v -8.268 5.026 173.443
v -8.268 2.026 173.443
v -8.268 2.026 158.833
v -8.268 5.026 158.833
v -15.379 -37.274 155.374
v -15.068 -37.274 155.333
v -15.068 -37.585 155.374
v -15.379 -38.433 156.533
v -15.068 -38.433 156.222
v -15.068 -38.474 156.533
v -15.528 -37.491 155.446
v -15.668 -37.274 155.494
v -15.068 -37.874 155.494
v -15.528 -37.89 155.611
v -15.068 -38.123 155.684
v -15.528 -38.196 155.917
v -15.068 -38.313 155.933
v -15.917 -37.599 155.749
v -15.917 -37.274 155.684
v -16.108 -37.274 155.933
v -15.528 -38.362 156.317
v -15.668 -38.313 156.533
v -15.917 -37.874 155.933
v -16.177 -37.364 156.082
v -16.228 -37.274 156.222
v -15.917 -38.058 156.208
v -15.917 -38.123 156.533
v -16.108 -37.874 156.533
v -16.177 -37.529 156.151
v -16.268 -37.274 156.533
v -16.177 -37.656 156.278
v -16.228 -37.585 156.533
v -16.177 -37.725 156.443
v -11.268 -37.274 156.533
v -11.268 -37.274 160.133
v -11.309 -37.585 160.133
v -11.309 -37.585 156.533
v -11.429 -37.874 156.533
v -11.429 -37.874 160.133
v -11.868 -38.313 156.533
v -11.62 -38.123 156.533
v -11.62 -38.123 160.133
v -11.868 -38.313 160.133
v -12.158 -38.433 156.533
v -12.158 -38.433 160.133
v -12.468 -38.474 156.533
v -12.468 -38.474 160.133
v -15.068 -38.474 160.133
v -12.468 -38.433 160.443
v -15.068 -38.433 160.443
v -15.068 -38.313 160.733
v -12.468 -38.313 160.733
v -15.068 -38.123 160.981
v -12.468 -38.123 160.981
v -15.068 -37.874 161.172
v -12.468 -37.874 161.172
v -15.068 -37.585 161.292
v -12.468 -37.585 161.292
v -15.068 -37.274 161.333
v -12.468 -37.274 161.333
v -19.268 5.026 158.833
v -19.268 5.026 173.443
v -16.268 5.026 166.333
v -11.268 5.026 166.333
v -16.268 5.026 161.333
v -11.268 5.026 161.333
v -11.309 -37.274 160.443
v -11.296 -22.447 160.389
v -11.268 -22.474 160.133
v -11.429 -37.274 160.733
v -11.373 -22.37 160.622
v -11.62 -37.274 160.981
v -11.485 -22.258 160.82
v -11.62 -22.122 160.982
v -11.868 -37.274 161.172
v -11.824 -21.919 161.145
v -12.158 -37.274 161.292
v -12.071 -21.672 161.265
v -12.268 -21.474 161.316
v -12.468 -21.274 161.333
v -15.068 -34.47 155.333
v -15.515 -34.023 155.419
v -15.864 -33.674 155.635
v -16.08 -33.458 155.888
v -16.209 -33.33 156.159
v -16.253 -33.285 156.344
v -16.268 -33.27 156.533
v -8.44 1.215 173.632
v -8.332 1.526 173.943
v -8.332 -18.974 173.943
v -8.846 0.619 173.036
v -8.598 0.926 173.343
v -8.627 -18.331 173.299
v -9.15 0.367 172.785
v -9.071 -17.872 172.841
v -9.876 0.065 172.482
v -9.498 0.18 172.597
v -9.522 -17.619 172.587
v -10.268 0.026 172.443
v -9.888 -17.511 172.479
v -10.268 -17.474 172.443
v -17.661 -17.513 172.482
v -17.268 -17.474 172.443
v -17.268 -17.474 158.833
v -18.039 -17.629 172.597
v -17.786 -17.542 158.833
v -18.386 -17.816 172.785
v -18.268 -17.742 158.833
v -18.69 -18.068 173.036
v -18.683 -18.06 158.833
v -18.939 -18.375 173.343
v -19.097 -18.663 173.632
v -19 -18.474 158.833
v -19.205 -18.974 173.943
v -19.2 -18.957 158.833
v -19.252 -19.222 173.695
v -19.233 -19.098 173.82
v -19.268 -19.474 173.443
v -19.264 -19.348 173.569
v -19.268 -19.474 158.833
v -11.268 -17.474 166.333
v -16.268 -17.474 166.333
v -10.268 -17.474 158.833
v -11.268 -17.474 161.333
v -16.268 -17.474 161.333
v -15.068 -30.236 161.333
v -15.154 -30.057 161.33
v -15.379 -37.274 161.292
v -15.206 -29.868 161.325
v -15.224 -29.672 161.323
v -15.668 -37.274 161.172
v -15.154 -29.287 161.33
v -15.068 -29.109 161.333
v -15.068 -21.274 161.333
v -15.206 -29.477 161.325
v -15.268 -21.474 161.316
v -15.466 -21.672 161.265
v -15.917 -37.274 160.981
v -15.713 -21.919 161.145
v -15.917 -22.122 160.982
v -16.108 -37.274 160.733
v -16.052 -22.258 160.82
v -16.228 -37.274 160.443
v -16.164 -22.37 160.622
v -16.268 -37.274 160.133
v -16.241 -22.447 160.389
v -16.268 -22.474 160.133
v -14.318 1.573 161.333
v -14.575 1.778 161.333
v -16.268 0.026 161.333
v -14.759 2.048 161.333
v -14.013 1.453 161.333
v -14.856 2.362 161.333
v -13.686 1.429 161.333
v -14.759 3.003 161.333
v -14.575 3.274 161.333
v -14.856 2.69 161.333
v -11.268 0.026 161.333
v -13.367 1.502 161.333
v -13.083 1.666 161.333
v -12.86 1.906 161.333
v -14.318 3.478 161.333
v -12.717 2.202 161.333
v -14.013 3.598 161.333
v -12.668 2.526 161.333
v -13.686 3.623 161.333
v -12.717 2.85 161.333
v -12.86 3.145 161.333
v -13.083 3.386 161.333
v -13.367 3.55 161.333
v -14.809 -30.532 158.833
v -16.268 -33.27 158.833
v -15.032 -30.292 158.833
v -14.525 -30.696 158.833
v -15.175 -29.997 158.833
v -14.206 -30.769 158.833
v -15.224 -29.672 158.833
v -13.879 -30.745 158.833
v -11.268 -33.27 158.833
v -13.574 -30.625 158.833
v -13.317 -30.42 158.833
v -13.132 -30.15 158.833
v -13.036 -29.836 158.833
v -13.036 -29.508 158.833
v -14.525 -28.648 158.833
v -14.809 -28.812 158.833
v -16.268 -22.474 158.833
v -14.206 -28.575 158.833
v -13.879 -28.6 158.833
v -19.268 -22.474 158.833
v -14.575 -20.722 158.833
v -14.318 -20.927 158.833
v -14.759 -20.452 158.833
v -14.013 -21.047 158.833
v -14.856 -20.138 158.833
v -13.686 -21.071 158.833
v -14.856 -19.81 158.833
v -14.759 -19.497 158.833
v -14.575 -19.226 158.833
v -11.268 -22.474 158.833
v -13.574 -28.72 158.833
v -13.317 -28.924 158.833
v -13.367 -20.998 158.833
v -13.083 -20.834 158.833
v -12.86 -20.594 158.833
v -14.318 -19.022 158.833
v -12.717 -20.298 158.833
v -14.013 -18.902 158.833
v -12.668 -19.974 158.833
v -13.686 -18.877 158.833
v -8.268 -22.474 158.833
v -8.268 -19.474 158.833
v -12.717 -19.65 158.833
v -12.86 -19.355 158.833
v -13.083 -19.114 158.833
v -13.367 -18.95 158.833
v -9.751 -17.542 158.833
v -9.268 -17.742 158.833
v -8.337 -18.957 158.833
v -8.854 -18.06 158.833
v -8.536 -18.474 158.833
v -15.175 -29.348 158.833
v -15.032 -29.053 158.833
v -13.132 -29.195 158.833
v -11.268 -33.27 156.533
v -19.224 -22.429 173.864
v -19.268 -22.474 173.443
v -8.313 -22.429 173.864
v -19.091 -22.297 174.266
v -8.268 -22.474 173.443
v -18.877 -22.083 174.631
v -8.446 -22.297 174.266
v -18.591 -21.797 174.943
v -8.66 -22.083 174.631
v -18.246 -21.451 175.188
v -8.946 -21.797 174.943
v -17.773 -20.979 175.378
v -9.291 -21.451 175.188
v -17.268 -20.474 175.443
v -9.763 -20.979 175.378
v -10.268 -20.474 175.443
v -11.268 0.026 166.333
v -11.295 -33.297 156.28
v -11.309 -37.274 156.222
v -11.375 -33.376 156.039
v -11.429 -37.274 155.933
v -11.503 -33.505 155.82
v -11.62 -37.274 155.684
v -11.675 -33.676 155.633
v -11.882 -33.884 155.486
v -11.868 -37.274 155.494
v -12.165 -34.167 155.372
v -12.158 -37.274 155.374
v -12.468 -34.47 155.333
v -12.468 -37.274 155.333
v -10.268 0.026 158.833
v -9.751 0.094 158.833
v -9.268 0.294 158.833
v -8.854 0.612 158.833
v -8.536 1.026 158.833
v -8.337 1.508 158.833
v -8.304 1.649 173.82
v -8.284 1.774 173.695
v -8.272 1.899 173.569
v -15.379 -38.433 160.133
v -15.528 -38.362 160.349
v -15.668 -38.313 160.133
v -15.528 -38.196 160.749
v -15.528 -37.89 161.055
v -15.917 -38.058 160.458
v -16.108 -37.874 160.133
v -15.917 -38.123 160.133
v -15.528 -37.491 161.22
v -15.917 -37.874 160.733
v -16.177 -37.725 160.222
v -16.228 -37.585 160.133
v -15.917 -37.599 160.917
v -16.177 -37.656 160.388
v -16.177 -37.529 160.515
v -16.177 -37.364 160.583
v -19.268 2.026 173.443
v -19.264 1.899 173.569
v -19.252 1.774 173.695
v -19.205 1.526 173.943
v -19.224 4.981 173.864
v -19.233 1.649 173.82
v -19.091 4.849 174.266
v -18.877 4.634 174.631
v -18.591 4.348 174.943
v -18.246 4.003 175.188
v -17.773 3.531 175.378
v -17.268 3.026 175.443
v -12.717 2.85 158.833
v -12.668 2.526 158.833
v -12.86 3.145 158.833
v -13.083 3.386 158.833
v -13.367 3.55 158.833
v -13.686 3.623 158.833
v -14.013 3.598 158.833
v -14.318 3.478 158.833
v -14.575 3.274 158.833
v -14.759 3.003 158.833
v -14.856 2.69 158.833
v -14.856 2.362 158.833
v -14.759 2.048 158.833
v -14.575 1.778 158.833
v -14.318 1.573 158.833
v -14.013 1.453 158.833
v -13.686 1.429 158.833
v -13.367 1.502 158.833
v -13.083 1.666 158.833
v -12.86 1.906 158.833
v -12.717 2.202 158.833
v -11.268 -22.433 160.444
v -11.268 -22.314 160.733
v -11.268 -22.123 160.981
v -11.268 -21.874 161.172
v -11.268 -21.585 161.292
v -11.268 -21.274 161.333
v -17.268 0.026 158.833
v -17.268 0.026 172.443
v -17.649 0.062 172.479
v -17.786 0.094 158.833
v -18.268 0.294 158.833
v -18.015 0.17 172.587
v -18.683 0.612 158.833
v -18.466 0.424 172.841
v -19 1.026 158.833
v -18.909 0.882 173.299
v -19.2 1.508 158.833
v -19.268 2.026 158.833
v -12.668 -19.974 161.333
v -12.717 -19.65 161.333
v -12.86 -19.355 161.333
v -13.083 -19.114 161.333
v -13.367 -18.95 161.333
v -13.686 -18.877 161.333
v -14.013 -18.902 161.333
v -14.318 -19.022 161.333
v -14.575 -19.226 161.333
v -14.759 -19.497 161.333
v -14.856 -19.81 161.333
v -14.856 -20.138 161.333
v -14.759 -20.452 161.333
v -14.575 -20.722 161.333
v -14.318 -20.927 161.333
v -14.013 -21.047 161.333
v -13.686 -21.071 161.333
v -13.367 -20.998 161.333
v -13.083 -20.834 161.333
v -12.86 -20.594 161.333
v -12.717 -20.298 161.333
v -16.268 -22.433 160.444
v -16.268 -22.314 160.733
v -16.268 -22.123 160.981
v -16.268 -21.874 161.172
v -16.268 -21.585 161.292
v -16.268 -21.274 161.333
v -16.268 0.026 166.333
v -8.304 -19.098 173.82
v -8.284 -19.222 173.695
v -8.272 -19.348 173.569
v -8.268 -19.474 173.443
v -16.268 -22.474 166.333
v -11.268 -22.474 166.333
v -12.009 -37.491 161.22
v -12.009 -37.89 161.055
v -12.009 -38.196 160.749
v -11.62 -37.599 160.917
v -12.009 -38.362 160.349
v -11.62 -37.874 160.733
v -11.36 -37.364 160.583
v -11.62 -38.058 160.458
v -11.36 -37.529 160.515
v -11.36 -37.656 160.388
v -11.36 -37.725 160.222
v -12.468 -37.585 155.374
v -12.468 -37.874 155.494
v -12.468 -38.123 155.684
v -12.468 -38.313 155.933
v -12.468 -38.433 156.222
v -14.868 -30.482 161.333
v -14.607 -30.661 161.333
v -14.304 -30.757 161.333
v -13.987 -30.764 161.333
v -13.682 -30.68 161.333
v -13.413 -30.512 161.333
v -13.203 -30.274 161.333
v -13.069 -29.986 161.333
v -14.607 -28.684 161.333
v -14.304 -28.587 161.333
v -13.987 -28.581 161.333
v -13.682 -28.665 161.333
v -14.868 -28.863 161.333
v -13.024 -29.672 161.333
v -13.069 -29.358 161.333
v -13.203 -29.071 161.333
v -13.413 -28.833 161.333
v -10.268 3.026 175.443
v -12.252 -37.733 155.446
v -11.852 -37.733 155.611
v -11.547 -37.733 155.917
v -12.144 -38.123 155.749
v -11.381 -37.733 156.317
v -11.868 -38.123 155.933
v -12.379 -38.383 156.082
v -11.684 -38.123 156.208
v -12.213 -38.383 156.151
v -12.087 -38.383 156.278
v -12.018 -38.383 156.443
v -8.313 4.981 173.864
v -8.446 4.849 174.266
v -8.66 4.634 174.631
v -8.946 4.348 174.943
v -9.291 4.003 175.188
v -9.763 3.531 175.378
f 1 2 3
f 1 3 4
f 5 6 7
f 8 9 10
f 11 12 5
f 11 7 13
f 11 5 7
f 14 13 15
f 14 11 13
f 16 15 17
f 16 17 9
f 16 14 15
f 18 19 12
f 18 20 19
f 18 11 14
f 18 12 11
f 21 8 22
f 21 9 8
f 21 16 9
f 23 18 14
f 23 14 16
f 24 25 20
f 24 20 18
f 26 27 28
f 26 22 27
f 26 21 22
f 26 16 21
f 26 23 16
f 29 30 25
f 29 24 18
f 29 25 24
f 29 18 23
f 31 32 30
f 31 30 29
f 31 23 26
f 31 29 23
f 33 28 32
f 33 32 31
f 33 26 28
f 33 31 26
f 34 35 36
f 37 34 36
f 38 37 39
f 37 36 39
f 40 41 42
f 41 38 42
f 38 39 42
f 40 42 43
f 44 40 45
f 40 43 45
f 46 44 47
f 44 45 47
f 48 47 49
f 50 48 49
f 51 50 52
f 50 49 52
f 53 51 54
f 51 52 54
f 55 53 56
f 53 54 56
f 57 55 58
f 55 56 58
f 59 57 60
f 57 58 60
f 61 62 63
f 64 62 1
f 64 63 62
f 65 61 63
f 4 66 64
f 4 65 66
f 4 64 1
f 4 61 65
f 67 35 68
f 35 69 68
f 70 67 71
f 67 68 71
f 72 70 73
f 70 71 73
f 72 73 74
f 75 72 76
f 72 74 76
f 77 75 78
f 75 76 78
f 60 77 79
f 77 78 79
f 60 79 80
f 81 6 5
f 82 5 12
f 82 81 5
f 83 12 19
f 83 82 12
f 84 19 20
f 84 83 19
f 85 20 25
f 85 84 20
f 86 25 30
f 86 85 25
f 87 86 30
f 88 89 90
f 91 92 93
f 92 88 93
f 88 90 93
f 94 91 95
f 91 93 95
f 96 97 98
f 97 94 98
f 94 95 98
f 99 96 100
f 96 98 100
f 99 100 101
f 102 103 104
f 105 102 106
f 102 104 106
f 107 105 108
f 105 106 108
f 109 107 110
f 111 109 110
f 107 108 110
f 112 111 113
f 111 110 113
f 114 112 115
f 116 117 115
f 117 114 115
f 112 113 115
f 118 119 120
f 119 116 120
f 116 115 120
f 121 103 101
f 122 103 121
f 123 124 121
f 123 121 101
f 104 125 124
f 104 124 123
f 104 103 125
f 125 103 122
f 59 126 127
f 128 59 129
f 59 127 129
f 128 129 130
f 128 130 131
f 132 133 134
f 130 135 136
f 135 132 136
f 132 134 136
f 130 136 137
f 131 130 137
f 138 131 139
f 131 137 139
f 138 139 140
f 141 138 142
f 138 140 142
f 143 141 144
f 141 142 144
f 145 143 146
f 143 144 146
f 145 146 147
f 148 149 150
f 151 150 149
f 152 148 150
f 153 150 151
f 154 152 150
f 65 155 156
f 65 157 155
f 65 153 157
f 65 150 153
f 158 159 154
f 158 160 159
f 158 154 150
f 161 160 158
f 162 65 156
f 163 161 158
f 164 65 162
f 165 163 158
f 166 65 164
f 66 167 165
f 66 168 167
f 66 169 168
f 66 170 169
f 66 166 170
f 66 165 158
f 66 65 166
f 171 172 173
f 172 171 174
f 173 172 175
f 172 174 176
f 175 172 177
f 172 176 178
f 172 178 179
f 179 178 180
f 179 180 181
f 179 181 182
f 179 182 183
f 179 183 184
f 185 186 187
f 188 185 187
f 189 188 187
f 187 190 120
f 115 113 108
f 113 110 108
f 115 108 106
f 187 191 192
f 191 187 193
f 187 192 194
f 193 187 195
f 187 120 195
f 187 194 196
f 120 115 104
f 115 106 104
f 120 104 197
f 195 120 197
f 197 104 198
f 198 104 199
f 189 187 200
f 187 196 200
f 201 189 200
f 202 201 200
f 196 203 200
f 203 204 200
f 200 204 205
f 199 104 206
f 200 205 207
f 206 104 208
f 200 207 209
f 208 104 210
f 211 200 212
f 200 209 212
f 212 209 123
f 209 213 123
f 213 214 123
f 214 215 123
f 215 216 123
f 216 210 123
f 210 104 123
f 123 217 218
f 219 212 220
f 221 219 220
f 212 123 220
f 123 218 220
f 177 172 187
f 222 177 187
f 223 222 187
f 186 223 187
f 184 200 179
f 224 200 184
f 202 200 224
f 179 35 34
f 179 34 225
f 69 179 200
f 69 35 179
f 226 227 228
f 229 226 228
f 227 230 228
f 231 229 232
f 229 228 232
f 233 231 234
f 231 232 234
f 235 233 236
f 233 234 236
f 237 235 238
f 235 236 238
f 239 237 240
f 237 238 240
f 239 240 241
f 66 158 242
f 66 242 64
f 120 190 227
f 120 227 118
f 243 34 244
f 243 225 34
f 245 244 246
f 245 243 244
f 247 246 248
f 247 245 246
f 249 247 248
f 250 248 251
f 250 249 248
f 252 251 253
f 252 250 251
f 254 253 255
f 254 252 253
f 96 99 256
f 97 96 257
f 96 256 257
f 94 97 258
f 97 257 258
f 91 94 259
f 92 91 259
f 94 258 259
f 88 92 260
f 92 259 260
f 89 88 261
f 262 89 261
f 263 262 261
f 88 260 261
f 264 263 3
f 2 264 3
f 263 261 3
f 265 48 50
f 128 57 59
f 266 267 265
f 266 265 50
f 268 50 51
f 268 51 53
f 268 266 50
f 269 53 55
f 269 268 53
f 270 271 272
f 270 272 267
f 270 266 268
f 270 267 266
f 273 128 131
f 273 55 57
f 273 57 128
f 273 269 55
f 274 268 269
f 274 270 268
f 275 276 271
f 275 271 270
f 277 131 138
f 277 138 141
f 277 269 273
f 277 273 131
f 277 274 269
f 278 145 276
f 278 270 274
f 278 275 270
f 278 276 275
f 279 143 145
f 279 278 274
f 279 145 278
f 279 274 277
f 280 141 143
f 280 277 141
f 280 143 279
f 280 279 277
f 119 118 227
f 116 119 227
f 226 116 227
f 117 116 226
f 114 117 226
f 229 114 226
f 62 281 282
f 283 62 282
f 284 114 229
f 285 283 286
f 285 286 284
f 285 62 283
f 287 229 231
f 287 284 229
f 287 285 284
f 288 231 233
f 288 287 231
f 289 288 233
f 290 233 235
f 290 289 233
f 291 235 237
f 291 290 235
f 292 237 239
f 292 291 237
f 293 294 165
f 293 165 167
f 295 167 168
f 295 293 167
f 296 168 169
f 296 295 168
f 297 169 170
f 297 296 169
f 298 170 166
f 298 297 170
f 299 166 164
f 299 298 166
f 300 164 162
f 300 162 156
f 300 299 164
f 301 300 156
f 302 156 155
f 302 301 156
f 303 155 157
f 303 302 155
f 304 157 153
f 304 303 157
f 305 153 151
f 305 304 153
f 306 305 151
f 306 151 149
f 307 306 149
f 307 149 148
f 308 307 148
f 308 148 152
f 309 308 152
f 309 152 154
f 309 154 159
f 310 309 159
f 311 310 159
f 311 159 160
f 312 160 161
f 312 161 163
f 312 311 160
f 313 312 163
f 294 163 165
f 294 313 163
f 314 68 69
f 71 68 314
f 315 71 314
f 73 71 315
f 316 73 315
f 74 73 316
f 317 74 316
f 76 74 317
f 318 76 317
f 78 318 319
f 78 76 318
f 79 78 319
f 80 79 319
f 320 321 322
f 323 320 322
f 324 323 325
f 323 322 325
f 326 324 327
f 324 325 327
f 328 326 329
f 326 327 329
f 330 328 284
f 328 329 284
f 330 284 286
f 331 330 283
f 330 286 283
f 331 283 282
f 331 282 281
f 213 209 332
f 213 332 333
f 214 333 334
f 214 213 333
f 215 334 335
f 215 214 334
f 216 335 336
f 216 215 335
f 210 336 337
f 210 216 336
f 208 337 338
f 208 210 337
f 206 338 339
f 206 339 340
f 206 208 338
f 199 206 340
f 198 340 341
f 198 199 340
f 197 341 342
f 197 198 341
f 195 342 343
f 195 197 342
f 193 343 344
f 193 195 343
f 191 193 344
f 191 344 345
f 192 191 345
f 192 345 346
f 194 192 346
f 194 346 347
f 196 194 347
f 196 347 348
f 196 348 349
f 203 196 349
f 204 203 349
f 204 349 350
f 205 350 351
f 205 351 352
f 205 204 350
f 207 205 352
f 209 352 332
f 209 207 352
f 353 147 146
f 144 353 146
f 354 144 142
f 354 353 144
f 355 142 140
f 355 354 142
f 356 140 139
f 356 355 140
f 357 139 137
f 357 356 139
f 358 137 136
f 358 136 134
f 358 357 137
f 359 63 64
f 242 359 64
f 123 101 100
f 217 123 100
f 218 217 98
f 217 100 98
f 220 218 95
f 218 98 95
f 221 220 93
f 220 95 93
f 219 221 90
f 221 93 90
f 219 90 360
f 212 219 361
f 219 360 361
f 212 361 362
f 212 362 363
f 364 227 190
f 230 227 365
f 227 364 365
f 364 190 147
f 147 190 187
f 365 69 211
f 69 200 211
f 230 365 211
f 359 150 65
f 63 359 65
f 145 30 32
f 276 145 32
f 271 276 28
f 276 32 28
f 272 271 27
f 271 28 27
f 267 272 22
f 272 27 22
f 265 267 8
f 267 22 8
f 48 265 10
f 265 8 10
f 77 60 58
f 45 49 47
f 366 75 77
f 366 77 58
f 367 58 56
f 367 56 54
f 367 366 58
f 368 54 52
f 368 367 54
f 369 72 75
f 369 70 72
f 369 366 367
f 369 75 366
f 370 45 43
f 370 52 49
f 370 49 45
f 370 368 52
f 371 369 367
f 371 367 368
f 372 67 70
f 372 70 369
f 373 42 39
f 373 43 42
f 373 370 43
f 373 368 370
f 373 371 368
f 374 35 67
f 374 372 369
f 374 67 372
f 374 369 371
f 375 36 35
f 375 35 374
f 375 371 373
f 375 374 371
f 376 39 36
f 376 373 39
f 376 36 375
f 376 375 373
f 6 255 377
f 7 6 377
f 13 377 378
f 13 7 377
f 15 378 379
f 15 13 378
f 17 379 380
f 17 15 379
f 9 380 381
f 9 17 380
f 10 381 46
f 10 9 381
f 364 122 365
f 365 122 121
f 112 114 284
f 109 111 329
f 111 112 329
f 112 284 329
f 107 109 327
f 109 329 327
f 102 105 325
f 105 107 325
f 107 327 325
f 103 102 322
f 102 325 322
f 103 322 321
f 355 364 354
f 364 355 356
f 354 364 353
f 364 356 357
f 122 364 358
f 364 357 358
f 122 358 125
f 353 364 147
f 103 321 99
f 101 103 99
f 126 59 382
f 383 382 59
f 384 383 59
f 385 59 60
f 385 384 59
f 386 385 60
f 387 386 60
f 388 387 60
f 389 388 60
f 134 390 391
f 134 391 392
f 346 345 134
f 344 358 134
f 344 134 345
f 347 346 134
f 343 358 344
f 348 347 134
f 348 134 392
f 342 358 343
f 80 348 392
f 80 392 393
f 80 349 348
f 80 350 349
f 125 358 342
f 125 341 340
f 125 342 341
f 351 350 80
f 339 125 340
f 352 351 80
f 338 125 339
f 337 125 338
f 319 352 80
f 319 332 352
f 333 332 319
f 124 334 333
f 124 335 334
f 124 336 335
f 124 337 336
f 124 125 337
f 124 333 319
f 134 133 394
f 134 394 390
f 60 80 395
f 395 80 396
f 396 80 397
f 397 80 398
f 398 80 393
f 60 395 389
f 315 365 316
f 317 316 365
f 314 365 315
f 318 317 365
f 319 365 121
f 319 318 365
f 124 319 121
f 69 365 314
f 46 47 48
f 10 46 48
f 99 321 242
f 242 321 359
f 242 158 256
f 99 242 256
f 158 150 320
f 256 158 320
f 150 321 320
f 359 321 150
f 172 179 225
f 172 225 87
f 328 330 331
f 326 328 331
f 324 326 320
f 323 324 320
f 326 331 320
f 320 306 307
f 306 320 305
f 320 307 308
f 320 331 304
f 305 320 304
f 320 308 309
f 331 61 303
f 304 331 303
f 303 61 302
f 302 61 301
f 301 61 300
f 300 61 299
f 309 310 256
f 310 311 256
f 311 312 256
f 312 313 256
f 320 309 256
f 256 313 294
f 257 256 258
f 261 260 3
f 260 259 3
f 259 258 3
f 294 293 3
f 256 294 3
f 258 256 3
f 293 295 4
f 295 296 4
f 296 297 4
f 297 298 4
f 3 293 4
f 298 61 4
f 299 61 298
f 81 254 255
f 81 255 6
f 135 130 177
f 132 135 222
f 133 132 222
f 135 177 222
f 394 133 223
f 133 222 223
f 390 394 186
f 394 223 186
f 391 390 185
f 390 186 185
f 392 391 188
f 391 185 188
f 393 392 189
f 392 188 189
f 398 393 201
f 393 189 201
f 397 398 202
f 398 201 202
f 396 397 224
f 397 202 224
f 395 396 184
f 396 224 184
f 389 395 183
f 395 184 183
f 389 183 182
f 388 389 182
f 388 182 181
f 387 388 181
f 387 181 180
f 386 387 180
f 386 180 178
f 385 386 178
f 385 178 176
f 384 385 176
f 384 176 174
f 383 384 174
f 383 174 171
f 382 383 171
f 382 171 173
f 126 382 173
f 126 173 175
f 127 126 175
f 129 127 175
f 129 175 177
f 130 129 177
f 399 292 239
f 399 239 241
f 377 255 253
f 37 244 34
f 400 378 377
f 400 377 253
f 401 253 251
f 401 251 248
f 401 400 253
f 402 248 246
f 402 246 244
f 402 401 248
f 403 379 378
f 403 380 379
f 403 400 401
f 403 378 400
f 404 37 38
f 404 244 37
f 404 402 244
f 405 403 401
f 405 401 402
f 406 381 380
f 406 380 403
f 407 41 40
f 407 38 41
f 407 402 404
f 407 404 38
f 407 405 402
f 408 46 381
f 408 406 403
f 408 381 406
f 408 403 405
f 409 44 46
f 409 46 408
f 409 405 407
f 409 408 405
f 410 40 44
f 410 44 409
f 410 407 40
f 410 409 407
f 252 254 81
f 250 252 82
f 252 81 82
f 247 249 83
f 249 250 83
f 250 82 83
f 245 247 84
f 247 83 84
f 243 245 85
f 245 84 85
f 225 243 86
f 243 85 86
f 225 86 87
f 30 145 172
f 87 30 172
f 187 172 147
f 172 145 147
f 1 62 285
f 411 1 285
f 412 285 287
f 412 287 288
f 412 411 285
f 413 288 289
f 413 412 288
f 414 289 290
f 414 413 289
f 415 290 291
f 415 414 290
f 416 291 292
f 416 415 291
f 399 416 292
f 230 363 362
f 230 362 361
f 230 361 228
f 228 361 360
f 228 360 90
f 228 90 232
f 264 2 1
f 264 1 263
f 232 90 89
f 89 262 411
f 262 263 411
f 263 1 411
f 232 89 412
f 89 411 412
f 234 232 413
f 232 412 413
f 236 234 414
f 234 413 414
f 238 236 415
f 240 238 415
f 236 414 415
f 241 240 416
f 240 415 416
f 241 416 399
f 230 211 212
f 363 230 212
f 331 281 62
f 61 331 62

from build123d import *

# Parameters (mm, degrees)
SZKIC1_R                      = 1.100000000000001
DODANIE_WYCI_GNI_CIE1_DEPTH   = 2.5
SZKIC1_W                      = 10.999999999999996
SZKIC1_H                      = 5.000000000000001
SZKIC1_R_2                    = 1.1000003399999918
DODANIE_WYCI_GNI_CIE1_2_DEPTH = 2.5
SKETCH1_W                     = 2.9999999999999964
SKETCH1_H                     = 5
SKETCH1_W_2                   = 2.999999999999993
SKETCH1_H_2                   = 5.000000000000001
SKETCH1_W_3                   = 3
SKETCH1_H_3                   = 5.0000000000000036
BOSS_EXTRUDE1_DEPTH           = 5
SKETCH2_W                     = 11.000000000000002
SKETCH2_H                     = 5.0000000000000036
SKETCH2_W_2                   = 10.999999999999996
SKETCH2_H_2                   = 5.000000000000001
BOSS_EXTRUDE2_DEPTH           = 6.11
SKETCH3_W                     = 11
SKETCH3_H                     = 27.5
BOSS_EXTRUDE3_DEPTH           = 3
FILLET1_R                     = 2
FILLET4_R                     = 2
SKETCH4_W                     = 5.000000000000005
SKETCH4_H                     = 2.5000000000000284
BOSS_EXTRUDE4_DEPTH           = 16
SKETCH5_W                     = 5.000000000000005
SKETCH5_H                     = 5.204234406731111
BOSS_EXTRUDE5_DEPTH           = 3.5
CUT_EXTRUDE1_REACH            = 48.124
SKETCH6_R                     = 1.100000000000001
FILLET5_R                     = 1.2
FILLET6_R                     = 1.2
FILLET7_R                     = 1.2


# Some blends are built 0.0001 mm under size
with BuildPart() as part:
    # Szkic1 → Dodanie-wyciągnięcie1 (new body)
    with BuildSketch(Plane.XY.offset(158.8328846419772)):
        Polygon((-19.268421222013334, -17.474256580110417), (-8.268421222013332, -17.474256580110413), (-8.268421222013332, -22.474256580110417), (-19.268421222013334, -22.474256580110417), align=None)
        with Locations((-13.768421222013336, -19.974256580110417)):
            Circle(SZKIC1_R, mode=Mode.SUBTRACT)
    extrude(amount=DODANIE_WYCI_GNI_CIE1_DEPTH)



with BuildPart() as body_2:
    # Szkic1 → Dodanie-wyci_gni_cie1 2 (new body)
    with BuildSketch(Plane.XY.offset(158.8328846419772)):
        with Locations((-13.768421222013332, 2.5257434198895825)):
            Rectangle(SZKIC1_W, SZKIC1_H)
        with Locations((-13.768421222013332, 2.5257434198895856)):
            Circle(SZKIC1_R_2, mode=Mode.SUBTRACT)
    extrude(amount=DODANIE_WYCI_GNI_CIE1_2_DEPTH)


with BuildPart() as part_1:
    add(part.part)

    add(body_2.part)  # Boss-Extrude1 merges body 2
    # Sketch1 → Boss-Extrude1 (add)
    with BuildSketch(Plane.XY.offset(161.33288464197722)):
        with Locations((-17.768421222013338, -19.974256580110417)):
            Rectangle(SKETCH1_W, SKETCH1_H)
        with Locations((-17.768421222013334, 2.5257434198895825)):
            Rectangle(SKETCH1_W_2, SKETCH1_H_2)
        with Locations((-9.768421222013334, 2.5257434198895825)):
            Rectangle(SKETCH1_W_3, SKETCH1_H_2)
        with Locations((-9.768421222013332, -19.974256580110413)):
            Rectangle(SKETCH1_W_3, SKETCH1_H_3)
    extrude(amount=BOSS_EXTRUDE1_DEPTH)

    # Sketch2 → Boss-Extrude2 (add)
    with BuildSketch(Plane.XY.offset(166.33288464197722)):
        with Locations((-13.768421222013334, -19.974256580110413)):
            Rectangle(SKETCH2_W, SKETCH2_H)
        with Locations((-13.768421222013332, 2.5257434198895825)):
            Rectangle(SKETCH2_W_2, SKETCH2_H_2)
    extrude(amount=BOSS_EXTRUDE2_DEPTH)

    # Sketch3 → Boss-Extrude3 (add)
    with BuildSketch(Plane.XY.offset(172.4428846419772)):
        with Locations((-13.768421222013334, -8.724256580110417)):
            Rectangle(SKETCH3_W, SKETCH3_H)
    extrude(amount=BOSS_EXTRUDE3_DEPTH)

    # Fillet1
    fillet1_edges = [part_1.edges().sort_by_distance(p)[0] for p in [
        (-19.268421222013334, -8.724256580110417, 175.4428846419772),
        (-13.768421222013334, -22.474256580110417, 175.4428846419772),
        (-8.268421222013334, -8.724256580110417, 175.4428846419772),
        (-13.768421222013334, 5.025743419889583, 175.4428846419772),
    ]]
    fillet(fillet1_edges, radius=FILLET1_R)

    # Fillet4
    # the kernel refuses this fillet: 2 mm, written as the material it takes off along each edge
    with BuildSketch(Plane(origin=(-8.268421222013334, -17.474256580110413, 172.4428846419772), x_dir=(0, 0, 1), z_dir=(0, 1, 0))) as fillet4_piece_1:
        with BuildLine():
            CenterArc((FILLET4_R, -FILLET4_R), FILLET4_R, 90, 90)
            Line((0, -FILLET4_R), (0, 0))
            Line((0, 0), (FILLET4_R, 0))
        make_face()
    extrude(amount=17.499999999999996, mode=Mode.SUBTRACT)
    with BuildSketch(Plane(origin=(-19.268421222013334, 0.02574341988958206, 172.4428846419772), x_dir=(1.78e-15, 0, 1), z_dir=(0, -1, 0))) as fillet4_piece_2:
        with BuildLine():
            CenterArc((FILLET4_R, -FILLET4_R), FILLET4_R, 90.0000000000001, 89.9999999999999)
            Line((3.55e-15, -FILLET4_R), (0, 0))
            Line((0, 0), (FILLET4_R, 0))
        make_face()
    extrude(amount=17.499999999999996, mode=Mode.SUBTRACT)
    with BuildSketch(Plane(origin=(-8.268421222013334, 0.02574341988958231, 153.8328846419772), x_dir=(0, 1, 0), z_dir=(0, 0, 1)), Plane(origin=(-19.26842122201333, 0.02574341988958231, 172.44288464197723), x_dir=(0, 1, 0), z_dir=(0, 0, -1))) as fillet4_piece_3:
        with BuildLine():
            CenterArc((FILLET4_R, FILLET4_R), FILLET4_R, 180, 90)
            Line((-2.5e-16, FILLET4_R), (0, 0))
            Line((0, 0), (FILLET4_R, 0))
        make_face()
    extrude(amount=18.610000000000042, mode=Mode.SUBTRACT)
    with BuildSketch(Plane(origin=(-19.26842122201333, -17.474256580110417, 153.8328846419772), x_dir=(0, -1, 2.6e-16), z_dir=(0, 2.6e-16, 1))) as fillet4_piece_4:
        with BuildLine():
            CenterArc((FILLET4_R, FILLET4_R), FILLET4_R, 180, 90)
            Line((0, FILLET4_R), (0, 0))
            Line((0, 0), (FILLET4_R, 0))
        make_face()
    extrude(amount=18.610000000000042, mode=Mode.SUBTRACT)
    with BuildSketch(Plane(origin=(-8.268421222013332, -17.474256580110413, 172.44288464197723), x_dir=(-8.9e-16, -1, 0), z_dir=(0, 0, -1))) as fillet4_piece_5:
        with BuildLine():
            CenterArc((FILLET4_R, FILLET4_R), FILLET4_R, 180, 89.99999999999994)
            Line((1.78e-15, FILLET4_R), (0, 0))
            Line((0, 0), (FILLET4_R, 0))
        make_face()
    extrude(amount=18.610000000000042, mode=Mode.SUBTRACT)
    with BuildSketch(Plane(origin=(-8.268421222013334, -17.474256580110413, 177.44288464197723), x_dir=(0, -1, 0), z_dir=(0, 0, -1))) as fillet4_piece_6a_section:
        with BuildLine():
            CenterArc((FILLET4_R, FILLET4_R), FILLET4_R, 180.00000000000006, 89.99999999999994)
            Line((0, FILLET4_R), (0, 0))
            Line((0, 0), (FILLET4_R, 0))
        make_face()
    fillet4_piece_6a = extrude(amount=23.610000000000042, mode=Mode.PRIVATE)
    fillet4_piece_6a = split(fillet4_piece_6a, bisect_by=Plane(origin=(-8.721211450546983, -17.92704680864406, 172.4428846419772), z_dir=(0, 0, 1)), keep=Keep.TOP, mode=Mode.PRIVATE)
    with BuildSketch(Plane(origin=(-8.268421222013334, -22.474256580110413, 172.4428846419772), x_dir=(0, 0, 1), z_dir=(0, 1, 0))) as fillet4_piece_6b_section:
        with BuildLine():
            CenterArc((FILLET4_R, -FILLET4_R), FILLET4_R, 90, 90)
            Line((0, -FILLET4_R), (0, 0))
            Line((0, 0), (FILLET4_R, 0))
        make_face()
    fillet4_piece_6b = extrude(amount=22.499999999999996, mode=Mode.PRIVATE)
    fillet4_piece_6b = split(fillet4_piece_6b, bisect_by=Plane(origin=(-8.721211450546978, -17.474256580110413, 172.89567487051085), z_dir=(3.2e-16, -1, 0)), keep=Keep.TOP, mode=Mode.PRIVATE)
    fillet4_piece_6 = fillet4_piece_6a & fillet4_piece_6b
    add(fillet4_piece_6, mode=Mode.SUBTRACT)
    with BuildSketch(Plane(origin=(-8.268421222013334, -17.474256580110413, 172.4428846419772), x_dir=(0, 0, 1), z_dir=(0, 1, 0))) as fillet4_piece_7a_section:
        with BuildLine():
            CenterArc((FILLET4_R, -FILLET4_R), FILLET4_R, 90, 90)
            Line((0, -FILLET4_R), (0, 0))
            Line((0, 0), (FILLET4_R, 0))
        make_face()
    fillet4_piece_7a = extrude(amount=22.499999999999996, mode=Mode.PRIVATE)
    fillet4_piece_7a = split(fillet4_piece_7a, bisect_by=Plane(origin=(-8.721211450546976, 0.02574341988958231, 172.89567487051085), z_dir=(0, 1, 0)), keep=Keep.TOP, mode=Mode.PRIVATE)
    with BuildSketch(Plane(origin=(-8.268421222013334, 0.02574341988958231, 153.8328846419772), x_dir=(0, 1, 0), z_dir=(0, 0, 1))) as fillet4_piece_7b_section:
        with BuildLine():
            CenterArc((FILLET4_R, FILLET4_R), FILLET4_R, 180, 90)
            Line((-2.5e-16, FILLET4_R), (0, 0))
            Line((0, 0), (FILLET4_R, 0))
        make_face()
    fillet4_piece_7b = extrude(amount=23.610000000000042, mode=Mode.PRIVATE)
    fillet4_piece_7b = split(fillet4_piece_7b, bisect_by=Plane(origin=(-8.721211450546985, 0.4785336484232321, 172.4428846419772), z_dir=(0, 0, 1)), keep=Keep.TOP, mode=Mode.PRIVATE)
    fillet4_piece_7 = fillet4_piece_7a & fillet4_piece_7b
    add(fillet4_piece_7, mode=Mode.SUBTRACT)
    with BuildSketch(Plane(origin=(-19.26842122201333, 0.02574341988958206, 177.44288464197723), x_dir=(0, 1, 0), z_dir=(0, 0, -1))) as fillet4_piece_8a_section:
        with BuildLine():
            CenterArc((FILLET4_R, FILLET4_R), FILLET4_R, 180, 90)
            Line((0, FILLET4_R), (0, 0))
            Line((0, 0), (FILLET4_R, 0))
        make_face()
    fillet4_piece_8a = extrude(amount=23.610000000000042, mode=Mode.PRIVATE)
    fillet4_piece_8a = split(fillet4_piece_8a, bisect_by=Plane(origin=(-18.81563099347968, 0.4785336484232321, 172.4428846419772), z_dir=(0, 0, 1)), keep=Keep.TOP, mode=Mode.PRIVATE)
    with BuildSketch(Plane(origin=(-19.26842122201333, 5.025743419889582, 172.4428846419772), x_dir=(0, 0, 1), z_dir=(0, -1, 0))) as fillet4_piece_8b_section:
        with BuildLine():
            CenterArc((FILLET4_R, -FILLET4_R), FILLET4_R, 90, 90)
            Line((0, -FILLET4_R), (0, 0))
            Line((0, 0), (FILLET4_R, 0))
        make_face()
    fillet4_piece_8b = extrude(amount=22.499999999999996, mode=Mode.PRIVATE)
    fillet4_piece_8b = split(fillet4_piece_8b, bisect_by=Plane(origin=(-18.815630993479687, 0.02574341988958231, 172.89567487051087), z_dir=(0, 1, 0)), keep=Keep.TOP, mode=Mode.PRIVATE)
    fillet4_piece_8 = fillet4_piece_8a & fillet4_piece_8b
    add(fillet4_piece_8, mode=Mode.SUBTRACT)
    with BuildSketch(Plane(origin=(-19.268421222013334, 0.02574341988958206, 172.4428846419772), x_dir=(1.78e-15, 0, 1), z_dir=(0, -1, 0))) as fillet4_piece_9a_section:
        with BuildLine():
            CenterArc((FILLET4_R, -FILLET4_R), FILLET4_R, 90.0000000000001, 89.9999999999999)
            Line((3.55e-15, -FILLET4_R), (0, 0))
            Line((0, 0), (FILLET4_R, 0))
        make_face()
    fillet4_piece_9a = extrude(amount=22.499999999999996, mode=Mode.PRIVATE)
    fillet4_piece_9a = split(fillet4_piece_9a, bisect_by=Plane(origin=(-18.815630993479687, -17.474256580110417, 172.89567487051082), z_dir=(3.2e-16, -1, 0)), keep=Keep.TOP, mode=Mode.PRIVATE)
    with BuildSketch(Plane(origin=(-19.26842122201333, -17.474256580110417, 153.8328846419772), x_dir=(0, -1, 2.6e-16), z_dir=(0, 2.6e-16, 1))) as fillet4_piece_9b_section:
        with BuildLine():
            CenterArc((FILLET4_R, FILLET4_R), FILLET4_R, 180, 90)
            Line((0, FILLET4_R), (0, 0))
            Line((0, 0), (FILLET4_R, 0))
        make_face()
    fillet4_piece_9b = extrude(amount=23.610000000000042, mode=Mode.PRIVATE)
    fillet4_piece_9b = split(fillet4_piece_9b, bisect_by=Plane(origin=(-18.815630993479676, -17.927046808644057, 172.4428846419772), z_dir=(0, 0, 1)), keep=Keep.TOP, mode=Mode.PRIVATE)
    fillet4_piece_9 = fillet4_piece_9a & fillet4_piece_9b
    add(fillet4_piece_9, mode=Mode.SUBTRACT)

    # Sketch4 → Boss-Extrude4 (add)
    with BuildSketch(Plane.XZ.offset(22.474256580110417)):
        with Locations((-13.768421222013334, 160.08288464197722)):
            Rectangle(SKETCH4_W, SKETCH4_H)
    extrude(amount=BOSS_EXTRUDE4_DEPTH)

    # Sketch5 → Boss-Extrude5 (add)
    with BuildSketch(Plane(origin=(0, 0, 158.8328846419772), x_dir=(-1, 0, 0), z_dir=(0, 0, -1))):
        with Locations((13.768421222013334, -35.872139376744855)):
            Rectangle(SKETCH5_W, SKETCH5_H)
    extrude(amount=BOSS_EXTRUDE5_DEPTH)

    # Sketch6 → Cut-Extrude1 (cut, up to next)
    with BuildSketch(Plane(origin=(0, 0, 158.8328846419772), x_dir=(-1, 0, 0), z_dir=(0, 0, -1)), mode=Mode.PRIVATE) as cut_extrude1_sk1:
        with Locations((14.12355315691837, -29.672298155784087)):
            Circle(SKETCH6_R)
    cut_extrude1_tool1 = extrude(cut_extrude1_sk1.sketch, amount=-CUT_EXTRUDE1_REACH, mode=Mode.PRIVATE) & part_1.part
    add(cut_extrude1_tool1.solids().sort_by_distance((-14.123553, -29.672298, 158.832885))[0], mode=Mode.SUBTRACT)

    # Fillet5
    fillet5_edges = [part_1.edges().sort_by_distance(p)[0] for p in [
        (-11.268421222013332, -35.872139376744855, 155.3328846419772),
        (-13.768421222013334, -38.47425658011041, 155.3328846419772),
        (-16.268421222013338, -35.872139376744855, 155.3328846419772),
        (-13.768421222013334, -33.2700221733793, 155.3328846419772),
    ]]
    fillet(fillet5_edges, radius=FILLET5_R)

    # Fillet6
    # the kernel refuses this fillet: 1.2 mm, written as the material it takes off along each edge
    with BuildSketch(Plane(origin=(-12.468421222013331, -37.27425658011042, 156.53288464197718), x_dir=(1, 0, 0), z_dir=(0, -1, 0))) as fillet6_piece_1_section:
        Polygon((0, 0), (FILLET6_R * 1.02, 0), (FILLET6_R * 1.02, -FILLET6_R * 1.02), (0, -FILLET6_R * 1.02), align=None)
    fillet6_piece_1 = extrude(amount=FILLET6_R * 1.02, mode=Mode.PRIVATE)
    fillet6_piece_1 = fillet6_piece_1 - Plane(origin=(-12.468421222013331, -37.27425658011042, 156.53288464197718), x_dir=(-0.7071067811865475, 0, 0.7071067811865475), z_dir=(0, -1, 0)) * Sphere(FILLET6_R, mode=Mode.PRIVATE)
    add(fillet6_piece_1, mode=Mode.SUBTRACT)
    with BuildSketch(Plane(origin=(-15.068421222013338, -37.27425658011042, 156.53288464197718), x_dir=(0, -1, 0), z_dir=(-1, 0, 0))) as fillet6_piece_2_section:
        Polygon((0, 0), (FILLET6_R * 1.02, 0), (FILLET6_R * 1.02, -FILLET6_R * 1.02), (0, -FILLET6_R * 1.02), align=None)
    fillet6_piece_2 = extrude(amount=FILLET6_R * 1.02, mode=Mode.PRIVATE)
    fillet6_piece_2 = fillet6_piece_2 - Plane(origin=(-15.068421222013338, -37.27425658011042, 156.53288464197718), x_dir=(0, 0.7071067811865475, 0.7071067811865475), z_dir=(-1, 0, 0)) * Sphere(FILLET6_R, mode=Mode.PRIVATE)
    add(fillet6_piece_2, mode=Mode.SUBTRACT)
    with BuildSketch(Plane(origin=(-12.468421222013331, -37.27425658011042, 160.13288464197723), x_dir=(0, -1, 0), z_dir=(1, 0, 0))) as fillet6_piece_3_section:
        Polygon((0, 0), (FILLET6_R * 1.02, 0), (FILLET6_R * 1.02, -FILLET6_R * 1.02), (0, -FILLET6_R * 1.02), align=None)
    fillet6_piece_3 = extrude(amount=FILLET6_R * 1.02, mode=Mode.PRIVATE)
    fillet6_piece_3 = fillet6_piece_3 - Plane(origin=(-12.468421222013331, -37.27425658011042, 160.13288464197723), x_dir=(0, 0.7071067811865475, -0.7071067811865475), z_dir=(1, 0, 0)) * Sphere(FILLET6_R, mode=Mode.PRIVATE)
    add(fillet6_piece_3, mode=Mode.SUBTRACT)
    with BuildSketch(Plane(origin=(-15.068421222013338, -37.27425658011042, 160.13288464197723), x_dir=(0, -1, 0), z_dir=(-1, 0, 0))) as fillet6_piece_4_section:
        Polygon((0, 0), (FILLET6_R * 1.02, 0), (FILLET6_R * 1.02, FILLET6_R * 1.02), (0, FILLET6_R * 1.02), align=None)
    fillet6_piece_4 = extrude(amount=FILLET6_R * 1.02, mode=Mode.PRIVATE)
    fillet6_piece_4 = fillet6_piece_4 - Plane(origin=(-15.068421222013338, -37.27425658011042, 160.13288464197723), x_dir=(0, 0.7071067811865475, -0.7071067811865475), z_dir=(-1, 0, 0)) * Sphere(FILLET6_R, mode=Mode.PRIVATE)
    add(fillet6_piece_4, mode=Mode.SUBTRACT)
    with BuildSketch(Plane(origin=(-11.268421222013332, -22.474256580110417, 161.33288464197722), x_dir=(-1, 0, -2.368e-14), z_dir=(0, -1, 0))) as fillet6_piece_5:
        with BuildLine():
            CenterArc((FILLET6_R, FILLET6_R), FILLET6_R, 180, 89.99999999999864)
            Line((2.842e-14, FILLET6_R), (0, 0))
            Line((0, 0), (FILLET6_R, 0))
        make_face()
    extrude(amount=14.8, mode=Mode.SUBTRACT)
    with BuildSketch(Plane(origin=(-16.268421222013338, -22.474256580110417, 161.33288464197722), x_dir=(0, 0, -1), z_dir=(0, -1, 0))) as fillet6_piece_6:
        with BuildLine():
            CenterArc((FILLET6_R, FILLET6_R), FILLET6_R, 180, 90)
            Line((0, FILLET6_R), (0, 0))
            Line((0, 0), (FILLET6_R, 0))
        make_face()
    extrude(amount=14.8, mode=Mode.SUBTRACT)
    with BuildSketch(Plane(origin=(-12.468421222013331, -38.47425658011042, 161.33288464197722), x_dir=(0, 0, -1), z_dir=(-1, 0, 0))) as fillet6_piece_7:
        with BuildLine():
            CenterArc((FILLET6_R, -FILLET6_R), FILLET6_R, 90, 90)
            Line((0, -FILLET6_R), (0, 0))
            Line((0, 0), (FILLET6_R, 0))
        make_face()
    extrude(amount=2.6000000000000068, mode=Mode.SUBTRACT)
    with BuildSketch(Plane(origin=(-16.268421222013338, -38.47425658011041, 156.53288464197718), x_dir=(0, 1, 1.18e-15), z_dir=(0, -1.18e-15, 1))) as fillet6_piece_8:
        with BuildLine():
            CenterArc((FILLET6_R, -FILLET6_R), FILLET6_R, 90, 90)
            Line((0, -FILLET6_R), (0, 0))
            Line((0, 0), (FILLET6_R, 0))
        make_face()
    extrude(amount=3.600000000000051, mode=Mode.SUBTRACT)
    with BuildSketch(Plane(origin=(-11.268421222013332, -38.47425658011042, 160.13288464197723), x_dir=(-1, 0, 0), z_dir=(0, 1.18e-15, -1))) as fillet6_piece_9:
        with BuildLine():
            CenterArc((FILLET6_R, FILLET6_R), FILLET6_R, 180, 90)
            Line((0, FILLET6_R), (0, 0))
            Line((0, 0), (FILLET6_R, 0))
        make_face()
    extrude(amount=3.600000000000051, mode=Mode.SUBTRACT)

    # Fillet7
    fillet7_edges = [part_1.edges().sort_by_distance(p)[0] for p in [
        (-15.668421222013, -22.47425658011, 161.332884641977),
        (-11.868421222013, -22.47425658011, 161.332884641977),
    ]]
    fillet(fillet7_edges, radius=FILLET7_R - 0.0001)  # a hair under: the kernel refuses the full size


solid = part_1.part
